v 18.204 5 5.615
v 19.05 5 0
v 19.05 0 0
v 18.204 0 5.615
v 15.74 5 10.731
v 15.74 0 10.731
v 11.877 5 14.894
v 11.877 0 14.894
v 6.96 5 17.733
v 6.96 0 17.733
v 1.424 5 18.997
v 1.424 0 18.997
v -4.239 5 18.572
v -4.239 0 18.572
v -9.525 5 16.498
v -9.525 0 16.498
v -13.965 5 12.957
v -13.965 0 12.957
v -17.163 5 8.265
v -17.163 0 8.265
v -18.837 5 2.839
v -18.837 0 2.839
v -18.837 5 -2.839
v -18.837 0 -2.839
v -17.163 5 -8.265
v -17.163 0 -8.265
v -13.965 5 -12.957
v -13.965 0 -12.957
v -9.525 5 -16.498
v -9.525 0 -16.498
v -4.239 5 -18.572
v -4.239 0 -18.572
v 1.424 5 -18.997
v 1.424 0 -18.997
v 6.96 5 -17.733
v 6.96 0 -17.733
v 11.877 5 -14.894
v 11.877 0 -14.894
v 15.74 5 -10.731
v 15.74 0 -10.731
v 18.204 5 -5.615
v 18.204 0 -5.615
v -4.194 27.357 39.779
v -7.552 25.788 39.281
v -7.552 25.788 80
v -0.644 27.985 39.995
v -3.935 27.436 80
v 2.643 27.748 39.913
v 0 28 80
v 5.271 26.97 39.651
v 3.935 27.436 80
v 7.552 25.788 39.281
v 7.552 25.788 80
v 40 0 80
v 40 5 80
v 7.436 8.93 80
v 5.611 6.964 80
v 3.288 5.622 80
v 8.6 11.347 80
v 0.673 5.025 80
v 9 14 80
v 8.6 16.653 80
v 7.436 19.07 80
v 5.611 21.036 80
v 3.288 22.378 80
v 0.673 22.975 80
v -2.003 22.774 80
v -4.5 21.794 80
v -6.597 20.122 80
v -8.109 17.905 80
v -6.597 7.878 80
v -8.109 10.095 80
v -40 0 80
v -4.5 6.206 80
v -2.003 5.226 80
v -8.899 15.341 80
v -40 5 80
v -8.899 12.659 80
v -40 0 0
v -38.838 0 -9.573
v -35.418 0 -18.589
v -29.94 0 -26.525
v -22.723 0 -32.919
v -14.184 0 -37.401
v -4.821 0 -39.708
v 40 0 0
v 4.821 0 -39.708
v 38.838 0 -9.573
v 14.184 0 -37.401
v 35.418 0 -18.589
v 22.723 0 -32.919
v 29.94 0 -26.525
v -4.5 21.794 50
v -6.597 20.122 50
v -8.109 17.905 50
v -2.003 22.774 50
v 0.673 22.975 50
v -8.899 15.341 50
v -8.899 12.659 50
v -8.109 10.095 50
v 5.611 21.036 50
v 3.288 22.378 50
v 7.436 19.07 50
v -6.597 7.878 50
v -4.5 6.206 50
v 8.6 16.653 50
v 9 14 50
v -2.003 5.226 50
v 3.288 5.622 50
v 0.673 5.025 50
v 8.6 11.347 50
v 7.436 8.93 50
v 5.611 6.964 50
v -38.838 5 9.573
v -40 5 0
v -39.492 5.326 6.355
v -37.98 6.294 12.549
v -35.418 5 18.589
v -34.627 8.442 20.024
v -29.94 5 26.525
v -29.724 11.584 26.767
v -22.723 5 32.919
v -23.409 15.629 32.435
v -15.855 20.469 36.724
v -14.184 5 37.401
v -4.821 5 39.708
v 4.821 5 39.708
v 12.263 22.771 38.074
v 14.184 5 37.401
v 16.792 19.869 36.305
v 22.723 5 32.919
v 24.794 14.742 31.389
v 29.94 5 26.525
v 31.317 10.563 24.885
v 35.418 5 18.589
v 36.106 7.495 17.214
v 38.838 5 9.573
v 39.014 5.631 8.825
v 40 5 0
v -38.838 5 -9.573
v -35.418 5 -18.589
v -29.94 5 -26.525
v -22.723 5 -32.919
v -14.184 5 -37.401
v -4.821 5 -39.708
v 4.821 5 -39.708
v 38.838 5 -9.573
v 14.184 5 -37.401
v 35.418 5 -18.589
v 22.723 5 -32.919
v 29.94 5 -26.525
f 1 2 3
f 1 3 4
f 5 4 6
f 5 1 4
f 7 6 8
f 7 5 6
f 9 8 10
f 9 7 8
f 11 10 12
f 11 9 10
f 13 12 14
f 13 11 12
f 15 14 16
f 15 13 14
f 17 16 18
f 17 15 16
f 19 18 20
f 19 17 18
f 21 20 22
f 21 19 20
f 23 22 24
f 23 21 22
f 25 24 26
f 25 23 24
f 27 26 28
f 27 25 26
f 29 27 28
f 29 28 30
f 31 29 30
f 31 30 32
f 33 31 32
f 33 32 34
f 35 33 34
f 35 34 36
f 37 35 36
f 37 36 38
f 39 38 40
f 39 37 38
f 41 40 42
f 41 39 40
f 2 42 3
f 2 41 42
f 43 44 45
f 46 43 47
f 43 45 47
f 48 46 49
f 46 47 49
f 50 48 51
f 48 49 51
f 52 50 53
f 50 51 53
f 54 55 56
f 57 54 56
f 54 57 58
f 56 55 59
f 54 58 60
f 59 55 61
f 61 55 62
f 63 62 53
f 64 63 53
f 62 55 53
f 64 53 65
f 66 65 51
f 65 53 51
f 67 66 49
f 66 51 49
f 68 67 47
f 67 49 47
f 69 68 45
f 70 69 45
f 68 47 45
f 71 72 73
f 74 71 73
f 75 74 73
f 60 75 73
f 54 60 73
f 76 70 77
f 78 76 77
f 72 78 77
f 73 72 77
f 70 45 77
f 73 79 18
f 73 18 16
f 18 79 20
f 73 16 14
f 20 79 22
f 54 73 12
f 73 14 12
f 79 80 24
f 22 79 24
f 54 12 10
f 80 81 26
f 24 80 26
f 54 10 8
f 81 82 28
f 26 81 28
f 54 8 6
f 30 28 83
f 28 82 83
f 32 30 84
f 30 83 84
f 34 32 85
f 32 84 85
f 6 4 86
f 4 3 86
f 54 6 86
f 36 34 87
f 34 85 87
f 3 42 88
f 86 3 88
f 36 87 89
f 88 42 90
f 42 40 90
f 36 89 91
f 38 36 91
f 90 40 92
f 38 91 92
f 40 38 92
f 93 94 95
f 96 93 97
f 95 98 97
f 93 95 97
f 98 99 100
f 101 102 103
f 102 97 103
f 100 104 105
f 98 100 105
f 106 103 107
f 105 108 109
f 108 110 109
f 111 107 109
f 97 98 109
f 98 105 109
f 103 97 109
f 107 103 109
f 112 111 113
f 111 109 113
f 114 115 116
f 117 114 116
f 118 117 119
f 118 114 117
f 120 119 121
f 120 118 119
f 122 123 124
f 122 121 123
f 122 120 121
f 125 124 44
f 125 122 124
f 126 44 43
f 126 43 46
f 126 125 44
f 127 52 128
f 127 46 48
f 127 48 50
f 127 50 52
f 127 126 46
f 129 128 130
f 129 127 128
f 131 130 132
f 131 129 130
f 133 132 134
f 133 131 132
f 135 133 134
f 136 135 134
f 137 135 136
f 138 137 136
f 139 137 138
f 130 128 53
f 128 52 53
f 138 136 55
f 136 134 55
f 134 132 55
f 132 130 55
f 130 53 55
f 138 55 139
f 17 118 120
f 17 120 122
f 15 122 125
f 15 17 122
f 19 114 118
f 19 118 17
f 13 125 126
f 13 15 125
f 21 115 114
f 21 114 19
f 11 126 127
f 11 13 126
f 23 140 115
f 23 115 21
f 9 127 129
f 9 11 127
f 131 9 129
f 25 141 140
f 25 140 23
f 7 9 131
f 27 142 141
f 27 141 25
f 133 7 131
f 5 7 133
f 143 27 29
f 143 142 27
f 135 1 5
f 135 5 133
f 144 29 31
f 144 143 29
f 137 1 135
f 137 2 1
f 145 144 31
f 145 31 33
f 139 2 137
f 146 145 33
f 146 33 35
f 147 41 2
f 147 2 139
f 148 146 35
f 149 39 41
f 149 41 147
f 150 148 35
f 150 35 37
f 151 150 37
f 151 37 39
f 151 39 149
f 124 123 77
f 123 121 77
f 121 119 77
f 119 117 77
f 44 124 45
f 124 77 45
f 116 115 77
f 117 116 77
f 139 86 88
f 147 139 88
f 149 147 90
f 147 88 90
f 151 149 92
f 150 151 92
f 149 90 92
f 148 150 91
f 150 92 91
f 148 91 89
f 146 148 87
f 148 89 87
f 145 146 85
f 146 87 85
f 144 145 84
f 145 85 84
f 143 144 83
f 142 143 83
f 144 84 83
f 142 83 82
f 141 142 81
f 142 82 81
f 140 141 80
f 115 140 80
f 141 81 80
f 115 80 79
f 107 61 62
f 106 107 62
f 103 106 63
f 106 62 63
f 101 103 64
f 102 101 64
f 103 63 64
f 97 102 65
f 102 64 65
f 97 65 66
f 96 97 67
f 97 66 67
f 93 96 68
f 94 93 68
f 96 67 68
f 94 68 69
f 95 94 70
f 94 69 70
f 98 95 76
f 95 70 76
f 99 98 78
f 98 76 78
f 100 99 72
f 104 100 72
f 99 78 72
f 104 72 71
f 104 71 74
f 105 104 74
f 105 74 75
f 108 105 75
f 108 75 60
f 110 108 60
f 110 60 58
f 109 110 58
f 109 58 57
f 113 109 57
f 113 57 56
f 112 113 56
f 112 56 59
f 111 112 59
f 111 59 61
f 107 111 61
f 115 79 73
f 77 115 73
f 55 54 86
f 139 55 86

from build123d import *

# Parameters (mm, degrees)
SKETCH1_R                                     = 19.05
PISTON_CONNECTION_PLATE_DEPTH                 = 5
SKETCH2_R                                     = 9
PLATFORM_TUBE_LINK_DEPTH                      = 80
ROD_START                                     = -50
SKETCH5_R                                     = 9
ROD_CAP_PREVENT_ROD_FROM_REACHING_PISTO_DEPTH = 50
CLEANUP_CUT_1_DEPTH                           = 94.722996111
CLEANUP_CUT_1_DEPTH_BACK                      = 94.722996111
SKETCH3_R                                     = 19.05
SKETCH4_R                                     = 40
CLEANUP_CUT_2_DEPTH                           = 93.352585349


with BuildPart() as part:
    # Sketch1 → Piston connection plate (new body)
    with BuildSketch(Plane(origin=(0, 0, 0), x_dir=(1, 0, 0), z_dir=(0, 1, 0))):
        with BuildLine():
            Line((-40, 0), (-40, -80))
            Line((-40, -80), (40, -80))
            Line((40, -80), (40, 0))
            ThreePointArc((40, 0), (0, 40), (-40, 0))
        make_face()
        with Locations(Location((0, 0, 0), (0, 0, 270))):
            Circle(SKETCH1_R, mode=Mode.SUBTRACT)
    extrude(amount=PISTON_CONNECTION_PLATE_DEPTH)

    # Sketch2 → Platform tube link (add)
    with BuildSketch(Plane.XY.offset(80)):
        with BuildLine():
            Line((-40, 5), (-7.552348551, 25.788215784))
            ThreePointArc((-7.552348551, 25.788215784), (0, 28), (7.552348551, 25.788215784))
            Line((7.552348551, 25.788215784), (40, 5))
            Line((40, 5), (40, 0))
            Line((40, 0), (-40, 0))
            Line((-40, 0), (-40, 5))
        make_face()
        with Locations((0, 14)):
            Circle(SKETCH2_R, mode=Mode.SUBTRACT)
    extrude(amount=-PLATFORM_TUBE_LINK_DEPTH)

    # Sketch5 → Rod cap (prevent rod from reaching piston) (add)
    with BuildSketch(Plane(origin=(0, 0, 0), x_dir=(-1, 0, 0), z_dir=(0, 0, -1)).offset(ROD_START)):
        with Locations(Location((0, 14, 0), (0, 0, 180))):
            Circle(SKETCH5_R)
    extrude(amount=ROD_CAP_PREVENT_ROD_FROM_REACHING_PISTO_DEPTH)

    # Sketch3 → Cleanup cut 1 (cut, two sides: drawn at the far end of the back side and taken through both)
    with BuildSketch(Plane.XZ.offset(-CLEANUP_CUT_1_DEPTH_BACK)):
        Circle(SKETCH3_R)
    extrude(amount=CLEANUP_CUT_1_DEPTH + CLEANUP_CUT_1_DEPTH_BACK, mode=Mode.SUBTRACT)

    # Sketch4 → Cleanup cut 2 (cut, through all)
    with BuildSketch(Plane(origin=(0, 5, 0), x_dir=(1, 0, 0), z_dir=(0, 1, 0))):
        Circle(SKETCH4_R)
    extrude(amount=CLEANUP_CUT_2_DEPTH, mode=Mode.SUBTRACT)


solid = part.part
